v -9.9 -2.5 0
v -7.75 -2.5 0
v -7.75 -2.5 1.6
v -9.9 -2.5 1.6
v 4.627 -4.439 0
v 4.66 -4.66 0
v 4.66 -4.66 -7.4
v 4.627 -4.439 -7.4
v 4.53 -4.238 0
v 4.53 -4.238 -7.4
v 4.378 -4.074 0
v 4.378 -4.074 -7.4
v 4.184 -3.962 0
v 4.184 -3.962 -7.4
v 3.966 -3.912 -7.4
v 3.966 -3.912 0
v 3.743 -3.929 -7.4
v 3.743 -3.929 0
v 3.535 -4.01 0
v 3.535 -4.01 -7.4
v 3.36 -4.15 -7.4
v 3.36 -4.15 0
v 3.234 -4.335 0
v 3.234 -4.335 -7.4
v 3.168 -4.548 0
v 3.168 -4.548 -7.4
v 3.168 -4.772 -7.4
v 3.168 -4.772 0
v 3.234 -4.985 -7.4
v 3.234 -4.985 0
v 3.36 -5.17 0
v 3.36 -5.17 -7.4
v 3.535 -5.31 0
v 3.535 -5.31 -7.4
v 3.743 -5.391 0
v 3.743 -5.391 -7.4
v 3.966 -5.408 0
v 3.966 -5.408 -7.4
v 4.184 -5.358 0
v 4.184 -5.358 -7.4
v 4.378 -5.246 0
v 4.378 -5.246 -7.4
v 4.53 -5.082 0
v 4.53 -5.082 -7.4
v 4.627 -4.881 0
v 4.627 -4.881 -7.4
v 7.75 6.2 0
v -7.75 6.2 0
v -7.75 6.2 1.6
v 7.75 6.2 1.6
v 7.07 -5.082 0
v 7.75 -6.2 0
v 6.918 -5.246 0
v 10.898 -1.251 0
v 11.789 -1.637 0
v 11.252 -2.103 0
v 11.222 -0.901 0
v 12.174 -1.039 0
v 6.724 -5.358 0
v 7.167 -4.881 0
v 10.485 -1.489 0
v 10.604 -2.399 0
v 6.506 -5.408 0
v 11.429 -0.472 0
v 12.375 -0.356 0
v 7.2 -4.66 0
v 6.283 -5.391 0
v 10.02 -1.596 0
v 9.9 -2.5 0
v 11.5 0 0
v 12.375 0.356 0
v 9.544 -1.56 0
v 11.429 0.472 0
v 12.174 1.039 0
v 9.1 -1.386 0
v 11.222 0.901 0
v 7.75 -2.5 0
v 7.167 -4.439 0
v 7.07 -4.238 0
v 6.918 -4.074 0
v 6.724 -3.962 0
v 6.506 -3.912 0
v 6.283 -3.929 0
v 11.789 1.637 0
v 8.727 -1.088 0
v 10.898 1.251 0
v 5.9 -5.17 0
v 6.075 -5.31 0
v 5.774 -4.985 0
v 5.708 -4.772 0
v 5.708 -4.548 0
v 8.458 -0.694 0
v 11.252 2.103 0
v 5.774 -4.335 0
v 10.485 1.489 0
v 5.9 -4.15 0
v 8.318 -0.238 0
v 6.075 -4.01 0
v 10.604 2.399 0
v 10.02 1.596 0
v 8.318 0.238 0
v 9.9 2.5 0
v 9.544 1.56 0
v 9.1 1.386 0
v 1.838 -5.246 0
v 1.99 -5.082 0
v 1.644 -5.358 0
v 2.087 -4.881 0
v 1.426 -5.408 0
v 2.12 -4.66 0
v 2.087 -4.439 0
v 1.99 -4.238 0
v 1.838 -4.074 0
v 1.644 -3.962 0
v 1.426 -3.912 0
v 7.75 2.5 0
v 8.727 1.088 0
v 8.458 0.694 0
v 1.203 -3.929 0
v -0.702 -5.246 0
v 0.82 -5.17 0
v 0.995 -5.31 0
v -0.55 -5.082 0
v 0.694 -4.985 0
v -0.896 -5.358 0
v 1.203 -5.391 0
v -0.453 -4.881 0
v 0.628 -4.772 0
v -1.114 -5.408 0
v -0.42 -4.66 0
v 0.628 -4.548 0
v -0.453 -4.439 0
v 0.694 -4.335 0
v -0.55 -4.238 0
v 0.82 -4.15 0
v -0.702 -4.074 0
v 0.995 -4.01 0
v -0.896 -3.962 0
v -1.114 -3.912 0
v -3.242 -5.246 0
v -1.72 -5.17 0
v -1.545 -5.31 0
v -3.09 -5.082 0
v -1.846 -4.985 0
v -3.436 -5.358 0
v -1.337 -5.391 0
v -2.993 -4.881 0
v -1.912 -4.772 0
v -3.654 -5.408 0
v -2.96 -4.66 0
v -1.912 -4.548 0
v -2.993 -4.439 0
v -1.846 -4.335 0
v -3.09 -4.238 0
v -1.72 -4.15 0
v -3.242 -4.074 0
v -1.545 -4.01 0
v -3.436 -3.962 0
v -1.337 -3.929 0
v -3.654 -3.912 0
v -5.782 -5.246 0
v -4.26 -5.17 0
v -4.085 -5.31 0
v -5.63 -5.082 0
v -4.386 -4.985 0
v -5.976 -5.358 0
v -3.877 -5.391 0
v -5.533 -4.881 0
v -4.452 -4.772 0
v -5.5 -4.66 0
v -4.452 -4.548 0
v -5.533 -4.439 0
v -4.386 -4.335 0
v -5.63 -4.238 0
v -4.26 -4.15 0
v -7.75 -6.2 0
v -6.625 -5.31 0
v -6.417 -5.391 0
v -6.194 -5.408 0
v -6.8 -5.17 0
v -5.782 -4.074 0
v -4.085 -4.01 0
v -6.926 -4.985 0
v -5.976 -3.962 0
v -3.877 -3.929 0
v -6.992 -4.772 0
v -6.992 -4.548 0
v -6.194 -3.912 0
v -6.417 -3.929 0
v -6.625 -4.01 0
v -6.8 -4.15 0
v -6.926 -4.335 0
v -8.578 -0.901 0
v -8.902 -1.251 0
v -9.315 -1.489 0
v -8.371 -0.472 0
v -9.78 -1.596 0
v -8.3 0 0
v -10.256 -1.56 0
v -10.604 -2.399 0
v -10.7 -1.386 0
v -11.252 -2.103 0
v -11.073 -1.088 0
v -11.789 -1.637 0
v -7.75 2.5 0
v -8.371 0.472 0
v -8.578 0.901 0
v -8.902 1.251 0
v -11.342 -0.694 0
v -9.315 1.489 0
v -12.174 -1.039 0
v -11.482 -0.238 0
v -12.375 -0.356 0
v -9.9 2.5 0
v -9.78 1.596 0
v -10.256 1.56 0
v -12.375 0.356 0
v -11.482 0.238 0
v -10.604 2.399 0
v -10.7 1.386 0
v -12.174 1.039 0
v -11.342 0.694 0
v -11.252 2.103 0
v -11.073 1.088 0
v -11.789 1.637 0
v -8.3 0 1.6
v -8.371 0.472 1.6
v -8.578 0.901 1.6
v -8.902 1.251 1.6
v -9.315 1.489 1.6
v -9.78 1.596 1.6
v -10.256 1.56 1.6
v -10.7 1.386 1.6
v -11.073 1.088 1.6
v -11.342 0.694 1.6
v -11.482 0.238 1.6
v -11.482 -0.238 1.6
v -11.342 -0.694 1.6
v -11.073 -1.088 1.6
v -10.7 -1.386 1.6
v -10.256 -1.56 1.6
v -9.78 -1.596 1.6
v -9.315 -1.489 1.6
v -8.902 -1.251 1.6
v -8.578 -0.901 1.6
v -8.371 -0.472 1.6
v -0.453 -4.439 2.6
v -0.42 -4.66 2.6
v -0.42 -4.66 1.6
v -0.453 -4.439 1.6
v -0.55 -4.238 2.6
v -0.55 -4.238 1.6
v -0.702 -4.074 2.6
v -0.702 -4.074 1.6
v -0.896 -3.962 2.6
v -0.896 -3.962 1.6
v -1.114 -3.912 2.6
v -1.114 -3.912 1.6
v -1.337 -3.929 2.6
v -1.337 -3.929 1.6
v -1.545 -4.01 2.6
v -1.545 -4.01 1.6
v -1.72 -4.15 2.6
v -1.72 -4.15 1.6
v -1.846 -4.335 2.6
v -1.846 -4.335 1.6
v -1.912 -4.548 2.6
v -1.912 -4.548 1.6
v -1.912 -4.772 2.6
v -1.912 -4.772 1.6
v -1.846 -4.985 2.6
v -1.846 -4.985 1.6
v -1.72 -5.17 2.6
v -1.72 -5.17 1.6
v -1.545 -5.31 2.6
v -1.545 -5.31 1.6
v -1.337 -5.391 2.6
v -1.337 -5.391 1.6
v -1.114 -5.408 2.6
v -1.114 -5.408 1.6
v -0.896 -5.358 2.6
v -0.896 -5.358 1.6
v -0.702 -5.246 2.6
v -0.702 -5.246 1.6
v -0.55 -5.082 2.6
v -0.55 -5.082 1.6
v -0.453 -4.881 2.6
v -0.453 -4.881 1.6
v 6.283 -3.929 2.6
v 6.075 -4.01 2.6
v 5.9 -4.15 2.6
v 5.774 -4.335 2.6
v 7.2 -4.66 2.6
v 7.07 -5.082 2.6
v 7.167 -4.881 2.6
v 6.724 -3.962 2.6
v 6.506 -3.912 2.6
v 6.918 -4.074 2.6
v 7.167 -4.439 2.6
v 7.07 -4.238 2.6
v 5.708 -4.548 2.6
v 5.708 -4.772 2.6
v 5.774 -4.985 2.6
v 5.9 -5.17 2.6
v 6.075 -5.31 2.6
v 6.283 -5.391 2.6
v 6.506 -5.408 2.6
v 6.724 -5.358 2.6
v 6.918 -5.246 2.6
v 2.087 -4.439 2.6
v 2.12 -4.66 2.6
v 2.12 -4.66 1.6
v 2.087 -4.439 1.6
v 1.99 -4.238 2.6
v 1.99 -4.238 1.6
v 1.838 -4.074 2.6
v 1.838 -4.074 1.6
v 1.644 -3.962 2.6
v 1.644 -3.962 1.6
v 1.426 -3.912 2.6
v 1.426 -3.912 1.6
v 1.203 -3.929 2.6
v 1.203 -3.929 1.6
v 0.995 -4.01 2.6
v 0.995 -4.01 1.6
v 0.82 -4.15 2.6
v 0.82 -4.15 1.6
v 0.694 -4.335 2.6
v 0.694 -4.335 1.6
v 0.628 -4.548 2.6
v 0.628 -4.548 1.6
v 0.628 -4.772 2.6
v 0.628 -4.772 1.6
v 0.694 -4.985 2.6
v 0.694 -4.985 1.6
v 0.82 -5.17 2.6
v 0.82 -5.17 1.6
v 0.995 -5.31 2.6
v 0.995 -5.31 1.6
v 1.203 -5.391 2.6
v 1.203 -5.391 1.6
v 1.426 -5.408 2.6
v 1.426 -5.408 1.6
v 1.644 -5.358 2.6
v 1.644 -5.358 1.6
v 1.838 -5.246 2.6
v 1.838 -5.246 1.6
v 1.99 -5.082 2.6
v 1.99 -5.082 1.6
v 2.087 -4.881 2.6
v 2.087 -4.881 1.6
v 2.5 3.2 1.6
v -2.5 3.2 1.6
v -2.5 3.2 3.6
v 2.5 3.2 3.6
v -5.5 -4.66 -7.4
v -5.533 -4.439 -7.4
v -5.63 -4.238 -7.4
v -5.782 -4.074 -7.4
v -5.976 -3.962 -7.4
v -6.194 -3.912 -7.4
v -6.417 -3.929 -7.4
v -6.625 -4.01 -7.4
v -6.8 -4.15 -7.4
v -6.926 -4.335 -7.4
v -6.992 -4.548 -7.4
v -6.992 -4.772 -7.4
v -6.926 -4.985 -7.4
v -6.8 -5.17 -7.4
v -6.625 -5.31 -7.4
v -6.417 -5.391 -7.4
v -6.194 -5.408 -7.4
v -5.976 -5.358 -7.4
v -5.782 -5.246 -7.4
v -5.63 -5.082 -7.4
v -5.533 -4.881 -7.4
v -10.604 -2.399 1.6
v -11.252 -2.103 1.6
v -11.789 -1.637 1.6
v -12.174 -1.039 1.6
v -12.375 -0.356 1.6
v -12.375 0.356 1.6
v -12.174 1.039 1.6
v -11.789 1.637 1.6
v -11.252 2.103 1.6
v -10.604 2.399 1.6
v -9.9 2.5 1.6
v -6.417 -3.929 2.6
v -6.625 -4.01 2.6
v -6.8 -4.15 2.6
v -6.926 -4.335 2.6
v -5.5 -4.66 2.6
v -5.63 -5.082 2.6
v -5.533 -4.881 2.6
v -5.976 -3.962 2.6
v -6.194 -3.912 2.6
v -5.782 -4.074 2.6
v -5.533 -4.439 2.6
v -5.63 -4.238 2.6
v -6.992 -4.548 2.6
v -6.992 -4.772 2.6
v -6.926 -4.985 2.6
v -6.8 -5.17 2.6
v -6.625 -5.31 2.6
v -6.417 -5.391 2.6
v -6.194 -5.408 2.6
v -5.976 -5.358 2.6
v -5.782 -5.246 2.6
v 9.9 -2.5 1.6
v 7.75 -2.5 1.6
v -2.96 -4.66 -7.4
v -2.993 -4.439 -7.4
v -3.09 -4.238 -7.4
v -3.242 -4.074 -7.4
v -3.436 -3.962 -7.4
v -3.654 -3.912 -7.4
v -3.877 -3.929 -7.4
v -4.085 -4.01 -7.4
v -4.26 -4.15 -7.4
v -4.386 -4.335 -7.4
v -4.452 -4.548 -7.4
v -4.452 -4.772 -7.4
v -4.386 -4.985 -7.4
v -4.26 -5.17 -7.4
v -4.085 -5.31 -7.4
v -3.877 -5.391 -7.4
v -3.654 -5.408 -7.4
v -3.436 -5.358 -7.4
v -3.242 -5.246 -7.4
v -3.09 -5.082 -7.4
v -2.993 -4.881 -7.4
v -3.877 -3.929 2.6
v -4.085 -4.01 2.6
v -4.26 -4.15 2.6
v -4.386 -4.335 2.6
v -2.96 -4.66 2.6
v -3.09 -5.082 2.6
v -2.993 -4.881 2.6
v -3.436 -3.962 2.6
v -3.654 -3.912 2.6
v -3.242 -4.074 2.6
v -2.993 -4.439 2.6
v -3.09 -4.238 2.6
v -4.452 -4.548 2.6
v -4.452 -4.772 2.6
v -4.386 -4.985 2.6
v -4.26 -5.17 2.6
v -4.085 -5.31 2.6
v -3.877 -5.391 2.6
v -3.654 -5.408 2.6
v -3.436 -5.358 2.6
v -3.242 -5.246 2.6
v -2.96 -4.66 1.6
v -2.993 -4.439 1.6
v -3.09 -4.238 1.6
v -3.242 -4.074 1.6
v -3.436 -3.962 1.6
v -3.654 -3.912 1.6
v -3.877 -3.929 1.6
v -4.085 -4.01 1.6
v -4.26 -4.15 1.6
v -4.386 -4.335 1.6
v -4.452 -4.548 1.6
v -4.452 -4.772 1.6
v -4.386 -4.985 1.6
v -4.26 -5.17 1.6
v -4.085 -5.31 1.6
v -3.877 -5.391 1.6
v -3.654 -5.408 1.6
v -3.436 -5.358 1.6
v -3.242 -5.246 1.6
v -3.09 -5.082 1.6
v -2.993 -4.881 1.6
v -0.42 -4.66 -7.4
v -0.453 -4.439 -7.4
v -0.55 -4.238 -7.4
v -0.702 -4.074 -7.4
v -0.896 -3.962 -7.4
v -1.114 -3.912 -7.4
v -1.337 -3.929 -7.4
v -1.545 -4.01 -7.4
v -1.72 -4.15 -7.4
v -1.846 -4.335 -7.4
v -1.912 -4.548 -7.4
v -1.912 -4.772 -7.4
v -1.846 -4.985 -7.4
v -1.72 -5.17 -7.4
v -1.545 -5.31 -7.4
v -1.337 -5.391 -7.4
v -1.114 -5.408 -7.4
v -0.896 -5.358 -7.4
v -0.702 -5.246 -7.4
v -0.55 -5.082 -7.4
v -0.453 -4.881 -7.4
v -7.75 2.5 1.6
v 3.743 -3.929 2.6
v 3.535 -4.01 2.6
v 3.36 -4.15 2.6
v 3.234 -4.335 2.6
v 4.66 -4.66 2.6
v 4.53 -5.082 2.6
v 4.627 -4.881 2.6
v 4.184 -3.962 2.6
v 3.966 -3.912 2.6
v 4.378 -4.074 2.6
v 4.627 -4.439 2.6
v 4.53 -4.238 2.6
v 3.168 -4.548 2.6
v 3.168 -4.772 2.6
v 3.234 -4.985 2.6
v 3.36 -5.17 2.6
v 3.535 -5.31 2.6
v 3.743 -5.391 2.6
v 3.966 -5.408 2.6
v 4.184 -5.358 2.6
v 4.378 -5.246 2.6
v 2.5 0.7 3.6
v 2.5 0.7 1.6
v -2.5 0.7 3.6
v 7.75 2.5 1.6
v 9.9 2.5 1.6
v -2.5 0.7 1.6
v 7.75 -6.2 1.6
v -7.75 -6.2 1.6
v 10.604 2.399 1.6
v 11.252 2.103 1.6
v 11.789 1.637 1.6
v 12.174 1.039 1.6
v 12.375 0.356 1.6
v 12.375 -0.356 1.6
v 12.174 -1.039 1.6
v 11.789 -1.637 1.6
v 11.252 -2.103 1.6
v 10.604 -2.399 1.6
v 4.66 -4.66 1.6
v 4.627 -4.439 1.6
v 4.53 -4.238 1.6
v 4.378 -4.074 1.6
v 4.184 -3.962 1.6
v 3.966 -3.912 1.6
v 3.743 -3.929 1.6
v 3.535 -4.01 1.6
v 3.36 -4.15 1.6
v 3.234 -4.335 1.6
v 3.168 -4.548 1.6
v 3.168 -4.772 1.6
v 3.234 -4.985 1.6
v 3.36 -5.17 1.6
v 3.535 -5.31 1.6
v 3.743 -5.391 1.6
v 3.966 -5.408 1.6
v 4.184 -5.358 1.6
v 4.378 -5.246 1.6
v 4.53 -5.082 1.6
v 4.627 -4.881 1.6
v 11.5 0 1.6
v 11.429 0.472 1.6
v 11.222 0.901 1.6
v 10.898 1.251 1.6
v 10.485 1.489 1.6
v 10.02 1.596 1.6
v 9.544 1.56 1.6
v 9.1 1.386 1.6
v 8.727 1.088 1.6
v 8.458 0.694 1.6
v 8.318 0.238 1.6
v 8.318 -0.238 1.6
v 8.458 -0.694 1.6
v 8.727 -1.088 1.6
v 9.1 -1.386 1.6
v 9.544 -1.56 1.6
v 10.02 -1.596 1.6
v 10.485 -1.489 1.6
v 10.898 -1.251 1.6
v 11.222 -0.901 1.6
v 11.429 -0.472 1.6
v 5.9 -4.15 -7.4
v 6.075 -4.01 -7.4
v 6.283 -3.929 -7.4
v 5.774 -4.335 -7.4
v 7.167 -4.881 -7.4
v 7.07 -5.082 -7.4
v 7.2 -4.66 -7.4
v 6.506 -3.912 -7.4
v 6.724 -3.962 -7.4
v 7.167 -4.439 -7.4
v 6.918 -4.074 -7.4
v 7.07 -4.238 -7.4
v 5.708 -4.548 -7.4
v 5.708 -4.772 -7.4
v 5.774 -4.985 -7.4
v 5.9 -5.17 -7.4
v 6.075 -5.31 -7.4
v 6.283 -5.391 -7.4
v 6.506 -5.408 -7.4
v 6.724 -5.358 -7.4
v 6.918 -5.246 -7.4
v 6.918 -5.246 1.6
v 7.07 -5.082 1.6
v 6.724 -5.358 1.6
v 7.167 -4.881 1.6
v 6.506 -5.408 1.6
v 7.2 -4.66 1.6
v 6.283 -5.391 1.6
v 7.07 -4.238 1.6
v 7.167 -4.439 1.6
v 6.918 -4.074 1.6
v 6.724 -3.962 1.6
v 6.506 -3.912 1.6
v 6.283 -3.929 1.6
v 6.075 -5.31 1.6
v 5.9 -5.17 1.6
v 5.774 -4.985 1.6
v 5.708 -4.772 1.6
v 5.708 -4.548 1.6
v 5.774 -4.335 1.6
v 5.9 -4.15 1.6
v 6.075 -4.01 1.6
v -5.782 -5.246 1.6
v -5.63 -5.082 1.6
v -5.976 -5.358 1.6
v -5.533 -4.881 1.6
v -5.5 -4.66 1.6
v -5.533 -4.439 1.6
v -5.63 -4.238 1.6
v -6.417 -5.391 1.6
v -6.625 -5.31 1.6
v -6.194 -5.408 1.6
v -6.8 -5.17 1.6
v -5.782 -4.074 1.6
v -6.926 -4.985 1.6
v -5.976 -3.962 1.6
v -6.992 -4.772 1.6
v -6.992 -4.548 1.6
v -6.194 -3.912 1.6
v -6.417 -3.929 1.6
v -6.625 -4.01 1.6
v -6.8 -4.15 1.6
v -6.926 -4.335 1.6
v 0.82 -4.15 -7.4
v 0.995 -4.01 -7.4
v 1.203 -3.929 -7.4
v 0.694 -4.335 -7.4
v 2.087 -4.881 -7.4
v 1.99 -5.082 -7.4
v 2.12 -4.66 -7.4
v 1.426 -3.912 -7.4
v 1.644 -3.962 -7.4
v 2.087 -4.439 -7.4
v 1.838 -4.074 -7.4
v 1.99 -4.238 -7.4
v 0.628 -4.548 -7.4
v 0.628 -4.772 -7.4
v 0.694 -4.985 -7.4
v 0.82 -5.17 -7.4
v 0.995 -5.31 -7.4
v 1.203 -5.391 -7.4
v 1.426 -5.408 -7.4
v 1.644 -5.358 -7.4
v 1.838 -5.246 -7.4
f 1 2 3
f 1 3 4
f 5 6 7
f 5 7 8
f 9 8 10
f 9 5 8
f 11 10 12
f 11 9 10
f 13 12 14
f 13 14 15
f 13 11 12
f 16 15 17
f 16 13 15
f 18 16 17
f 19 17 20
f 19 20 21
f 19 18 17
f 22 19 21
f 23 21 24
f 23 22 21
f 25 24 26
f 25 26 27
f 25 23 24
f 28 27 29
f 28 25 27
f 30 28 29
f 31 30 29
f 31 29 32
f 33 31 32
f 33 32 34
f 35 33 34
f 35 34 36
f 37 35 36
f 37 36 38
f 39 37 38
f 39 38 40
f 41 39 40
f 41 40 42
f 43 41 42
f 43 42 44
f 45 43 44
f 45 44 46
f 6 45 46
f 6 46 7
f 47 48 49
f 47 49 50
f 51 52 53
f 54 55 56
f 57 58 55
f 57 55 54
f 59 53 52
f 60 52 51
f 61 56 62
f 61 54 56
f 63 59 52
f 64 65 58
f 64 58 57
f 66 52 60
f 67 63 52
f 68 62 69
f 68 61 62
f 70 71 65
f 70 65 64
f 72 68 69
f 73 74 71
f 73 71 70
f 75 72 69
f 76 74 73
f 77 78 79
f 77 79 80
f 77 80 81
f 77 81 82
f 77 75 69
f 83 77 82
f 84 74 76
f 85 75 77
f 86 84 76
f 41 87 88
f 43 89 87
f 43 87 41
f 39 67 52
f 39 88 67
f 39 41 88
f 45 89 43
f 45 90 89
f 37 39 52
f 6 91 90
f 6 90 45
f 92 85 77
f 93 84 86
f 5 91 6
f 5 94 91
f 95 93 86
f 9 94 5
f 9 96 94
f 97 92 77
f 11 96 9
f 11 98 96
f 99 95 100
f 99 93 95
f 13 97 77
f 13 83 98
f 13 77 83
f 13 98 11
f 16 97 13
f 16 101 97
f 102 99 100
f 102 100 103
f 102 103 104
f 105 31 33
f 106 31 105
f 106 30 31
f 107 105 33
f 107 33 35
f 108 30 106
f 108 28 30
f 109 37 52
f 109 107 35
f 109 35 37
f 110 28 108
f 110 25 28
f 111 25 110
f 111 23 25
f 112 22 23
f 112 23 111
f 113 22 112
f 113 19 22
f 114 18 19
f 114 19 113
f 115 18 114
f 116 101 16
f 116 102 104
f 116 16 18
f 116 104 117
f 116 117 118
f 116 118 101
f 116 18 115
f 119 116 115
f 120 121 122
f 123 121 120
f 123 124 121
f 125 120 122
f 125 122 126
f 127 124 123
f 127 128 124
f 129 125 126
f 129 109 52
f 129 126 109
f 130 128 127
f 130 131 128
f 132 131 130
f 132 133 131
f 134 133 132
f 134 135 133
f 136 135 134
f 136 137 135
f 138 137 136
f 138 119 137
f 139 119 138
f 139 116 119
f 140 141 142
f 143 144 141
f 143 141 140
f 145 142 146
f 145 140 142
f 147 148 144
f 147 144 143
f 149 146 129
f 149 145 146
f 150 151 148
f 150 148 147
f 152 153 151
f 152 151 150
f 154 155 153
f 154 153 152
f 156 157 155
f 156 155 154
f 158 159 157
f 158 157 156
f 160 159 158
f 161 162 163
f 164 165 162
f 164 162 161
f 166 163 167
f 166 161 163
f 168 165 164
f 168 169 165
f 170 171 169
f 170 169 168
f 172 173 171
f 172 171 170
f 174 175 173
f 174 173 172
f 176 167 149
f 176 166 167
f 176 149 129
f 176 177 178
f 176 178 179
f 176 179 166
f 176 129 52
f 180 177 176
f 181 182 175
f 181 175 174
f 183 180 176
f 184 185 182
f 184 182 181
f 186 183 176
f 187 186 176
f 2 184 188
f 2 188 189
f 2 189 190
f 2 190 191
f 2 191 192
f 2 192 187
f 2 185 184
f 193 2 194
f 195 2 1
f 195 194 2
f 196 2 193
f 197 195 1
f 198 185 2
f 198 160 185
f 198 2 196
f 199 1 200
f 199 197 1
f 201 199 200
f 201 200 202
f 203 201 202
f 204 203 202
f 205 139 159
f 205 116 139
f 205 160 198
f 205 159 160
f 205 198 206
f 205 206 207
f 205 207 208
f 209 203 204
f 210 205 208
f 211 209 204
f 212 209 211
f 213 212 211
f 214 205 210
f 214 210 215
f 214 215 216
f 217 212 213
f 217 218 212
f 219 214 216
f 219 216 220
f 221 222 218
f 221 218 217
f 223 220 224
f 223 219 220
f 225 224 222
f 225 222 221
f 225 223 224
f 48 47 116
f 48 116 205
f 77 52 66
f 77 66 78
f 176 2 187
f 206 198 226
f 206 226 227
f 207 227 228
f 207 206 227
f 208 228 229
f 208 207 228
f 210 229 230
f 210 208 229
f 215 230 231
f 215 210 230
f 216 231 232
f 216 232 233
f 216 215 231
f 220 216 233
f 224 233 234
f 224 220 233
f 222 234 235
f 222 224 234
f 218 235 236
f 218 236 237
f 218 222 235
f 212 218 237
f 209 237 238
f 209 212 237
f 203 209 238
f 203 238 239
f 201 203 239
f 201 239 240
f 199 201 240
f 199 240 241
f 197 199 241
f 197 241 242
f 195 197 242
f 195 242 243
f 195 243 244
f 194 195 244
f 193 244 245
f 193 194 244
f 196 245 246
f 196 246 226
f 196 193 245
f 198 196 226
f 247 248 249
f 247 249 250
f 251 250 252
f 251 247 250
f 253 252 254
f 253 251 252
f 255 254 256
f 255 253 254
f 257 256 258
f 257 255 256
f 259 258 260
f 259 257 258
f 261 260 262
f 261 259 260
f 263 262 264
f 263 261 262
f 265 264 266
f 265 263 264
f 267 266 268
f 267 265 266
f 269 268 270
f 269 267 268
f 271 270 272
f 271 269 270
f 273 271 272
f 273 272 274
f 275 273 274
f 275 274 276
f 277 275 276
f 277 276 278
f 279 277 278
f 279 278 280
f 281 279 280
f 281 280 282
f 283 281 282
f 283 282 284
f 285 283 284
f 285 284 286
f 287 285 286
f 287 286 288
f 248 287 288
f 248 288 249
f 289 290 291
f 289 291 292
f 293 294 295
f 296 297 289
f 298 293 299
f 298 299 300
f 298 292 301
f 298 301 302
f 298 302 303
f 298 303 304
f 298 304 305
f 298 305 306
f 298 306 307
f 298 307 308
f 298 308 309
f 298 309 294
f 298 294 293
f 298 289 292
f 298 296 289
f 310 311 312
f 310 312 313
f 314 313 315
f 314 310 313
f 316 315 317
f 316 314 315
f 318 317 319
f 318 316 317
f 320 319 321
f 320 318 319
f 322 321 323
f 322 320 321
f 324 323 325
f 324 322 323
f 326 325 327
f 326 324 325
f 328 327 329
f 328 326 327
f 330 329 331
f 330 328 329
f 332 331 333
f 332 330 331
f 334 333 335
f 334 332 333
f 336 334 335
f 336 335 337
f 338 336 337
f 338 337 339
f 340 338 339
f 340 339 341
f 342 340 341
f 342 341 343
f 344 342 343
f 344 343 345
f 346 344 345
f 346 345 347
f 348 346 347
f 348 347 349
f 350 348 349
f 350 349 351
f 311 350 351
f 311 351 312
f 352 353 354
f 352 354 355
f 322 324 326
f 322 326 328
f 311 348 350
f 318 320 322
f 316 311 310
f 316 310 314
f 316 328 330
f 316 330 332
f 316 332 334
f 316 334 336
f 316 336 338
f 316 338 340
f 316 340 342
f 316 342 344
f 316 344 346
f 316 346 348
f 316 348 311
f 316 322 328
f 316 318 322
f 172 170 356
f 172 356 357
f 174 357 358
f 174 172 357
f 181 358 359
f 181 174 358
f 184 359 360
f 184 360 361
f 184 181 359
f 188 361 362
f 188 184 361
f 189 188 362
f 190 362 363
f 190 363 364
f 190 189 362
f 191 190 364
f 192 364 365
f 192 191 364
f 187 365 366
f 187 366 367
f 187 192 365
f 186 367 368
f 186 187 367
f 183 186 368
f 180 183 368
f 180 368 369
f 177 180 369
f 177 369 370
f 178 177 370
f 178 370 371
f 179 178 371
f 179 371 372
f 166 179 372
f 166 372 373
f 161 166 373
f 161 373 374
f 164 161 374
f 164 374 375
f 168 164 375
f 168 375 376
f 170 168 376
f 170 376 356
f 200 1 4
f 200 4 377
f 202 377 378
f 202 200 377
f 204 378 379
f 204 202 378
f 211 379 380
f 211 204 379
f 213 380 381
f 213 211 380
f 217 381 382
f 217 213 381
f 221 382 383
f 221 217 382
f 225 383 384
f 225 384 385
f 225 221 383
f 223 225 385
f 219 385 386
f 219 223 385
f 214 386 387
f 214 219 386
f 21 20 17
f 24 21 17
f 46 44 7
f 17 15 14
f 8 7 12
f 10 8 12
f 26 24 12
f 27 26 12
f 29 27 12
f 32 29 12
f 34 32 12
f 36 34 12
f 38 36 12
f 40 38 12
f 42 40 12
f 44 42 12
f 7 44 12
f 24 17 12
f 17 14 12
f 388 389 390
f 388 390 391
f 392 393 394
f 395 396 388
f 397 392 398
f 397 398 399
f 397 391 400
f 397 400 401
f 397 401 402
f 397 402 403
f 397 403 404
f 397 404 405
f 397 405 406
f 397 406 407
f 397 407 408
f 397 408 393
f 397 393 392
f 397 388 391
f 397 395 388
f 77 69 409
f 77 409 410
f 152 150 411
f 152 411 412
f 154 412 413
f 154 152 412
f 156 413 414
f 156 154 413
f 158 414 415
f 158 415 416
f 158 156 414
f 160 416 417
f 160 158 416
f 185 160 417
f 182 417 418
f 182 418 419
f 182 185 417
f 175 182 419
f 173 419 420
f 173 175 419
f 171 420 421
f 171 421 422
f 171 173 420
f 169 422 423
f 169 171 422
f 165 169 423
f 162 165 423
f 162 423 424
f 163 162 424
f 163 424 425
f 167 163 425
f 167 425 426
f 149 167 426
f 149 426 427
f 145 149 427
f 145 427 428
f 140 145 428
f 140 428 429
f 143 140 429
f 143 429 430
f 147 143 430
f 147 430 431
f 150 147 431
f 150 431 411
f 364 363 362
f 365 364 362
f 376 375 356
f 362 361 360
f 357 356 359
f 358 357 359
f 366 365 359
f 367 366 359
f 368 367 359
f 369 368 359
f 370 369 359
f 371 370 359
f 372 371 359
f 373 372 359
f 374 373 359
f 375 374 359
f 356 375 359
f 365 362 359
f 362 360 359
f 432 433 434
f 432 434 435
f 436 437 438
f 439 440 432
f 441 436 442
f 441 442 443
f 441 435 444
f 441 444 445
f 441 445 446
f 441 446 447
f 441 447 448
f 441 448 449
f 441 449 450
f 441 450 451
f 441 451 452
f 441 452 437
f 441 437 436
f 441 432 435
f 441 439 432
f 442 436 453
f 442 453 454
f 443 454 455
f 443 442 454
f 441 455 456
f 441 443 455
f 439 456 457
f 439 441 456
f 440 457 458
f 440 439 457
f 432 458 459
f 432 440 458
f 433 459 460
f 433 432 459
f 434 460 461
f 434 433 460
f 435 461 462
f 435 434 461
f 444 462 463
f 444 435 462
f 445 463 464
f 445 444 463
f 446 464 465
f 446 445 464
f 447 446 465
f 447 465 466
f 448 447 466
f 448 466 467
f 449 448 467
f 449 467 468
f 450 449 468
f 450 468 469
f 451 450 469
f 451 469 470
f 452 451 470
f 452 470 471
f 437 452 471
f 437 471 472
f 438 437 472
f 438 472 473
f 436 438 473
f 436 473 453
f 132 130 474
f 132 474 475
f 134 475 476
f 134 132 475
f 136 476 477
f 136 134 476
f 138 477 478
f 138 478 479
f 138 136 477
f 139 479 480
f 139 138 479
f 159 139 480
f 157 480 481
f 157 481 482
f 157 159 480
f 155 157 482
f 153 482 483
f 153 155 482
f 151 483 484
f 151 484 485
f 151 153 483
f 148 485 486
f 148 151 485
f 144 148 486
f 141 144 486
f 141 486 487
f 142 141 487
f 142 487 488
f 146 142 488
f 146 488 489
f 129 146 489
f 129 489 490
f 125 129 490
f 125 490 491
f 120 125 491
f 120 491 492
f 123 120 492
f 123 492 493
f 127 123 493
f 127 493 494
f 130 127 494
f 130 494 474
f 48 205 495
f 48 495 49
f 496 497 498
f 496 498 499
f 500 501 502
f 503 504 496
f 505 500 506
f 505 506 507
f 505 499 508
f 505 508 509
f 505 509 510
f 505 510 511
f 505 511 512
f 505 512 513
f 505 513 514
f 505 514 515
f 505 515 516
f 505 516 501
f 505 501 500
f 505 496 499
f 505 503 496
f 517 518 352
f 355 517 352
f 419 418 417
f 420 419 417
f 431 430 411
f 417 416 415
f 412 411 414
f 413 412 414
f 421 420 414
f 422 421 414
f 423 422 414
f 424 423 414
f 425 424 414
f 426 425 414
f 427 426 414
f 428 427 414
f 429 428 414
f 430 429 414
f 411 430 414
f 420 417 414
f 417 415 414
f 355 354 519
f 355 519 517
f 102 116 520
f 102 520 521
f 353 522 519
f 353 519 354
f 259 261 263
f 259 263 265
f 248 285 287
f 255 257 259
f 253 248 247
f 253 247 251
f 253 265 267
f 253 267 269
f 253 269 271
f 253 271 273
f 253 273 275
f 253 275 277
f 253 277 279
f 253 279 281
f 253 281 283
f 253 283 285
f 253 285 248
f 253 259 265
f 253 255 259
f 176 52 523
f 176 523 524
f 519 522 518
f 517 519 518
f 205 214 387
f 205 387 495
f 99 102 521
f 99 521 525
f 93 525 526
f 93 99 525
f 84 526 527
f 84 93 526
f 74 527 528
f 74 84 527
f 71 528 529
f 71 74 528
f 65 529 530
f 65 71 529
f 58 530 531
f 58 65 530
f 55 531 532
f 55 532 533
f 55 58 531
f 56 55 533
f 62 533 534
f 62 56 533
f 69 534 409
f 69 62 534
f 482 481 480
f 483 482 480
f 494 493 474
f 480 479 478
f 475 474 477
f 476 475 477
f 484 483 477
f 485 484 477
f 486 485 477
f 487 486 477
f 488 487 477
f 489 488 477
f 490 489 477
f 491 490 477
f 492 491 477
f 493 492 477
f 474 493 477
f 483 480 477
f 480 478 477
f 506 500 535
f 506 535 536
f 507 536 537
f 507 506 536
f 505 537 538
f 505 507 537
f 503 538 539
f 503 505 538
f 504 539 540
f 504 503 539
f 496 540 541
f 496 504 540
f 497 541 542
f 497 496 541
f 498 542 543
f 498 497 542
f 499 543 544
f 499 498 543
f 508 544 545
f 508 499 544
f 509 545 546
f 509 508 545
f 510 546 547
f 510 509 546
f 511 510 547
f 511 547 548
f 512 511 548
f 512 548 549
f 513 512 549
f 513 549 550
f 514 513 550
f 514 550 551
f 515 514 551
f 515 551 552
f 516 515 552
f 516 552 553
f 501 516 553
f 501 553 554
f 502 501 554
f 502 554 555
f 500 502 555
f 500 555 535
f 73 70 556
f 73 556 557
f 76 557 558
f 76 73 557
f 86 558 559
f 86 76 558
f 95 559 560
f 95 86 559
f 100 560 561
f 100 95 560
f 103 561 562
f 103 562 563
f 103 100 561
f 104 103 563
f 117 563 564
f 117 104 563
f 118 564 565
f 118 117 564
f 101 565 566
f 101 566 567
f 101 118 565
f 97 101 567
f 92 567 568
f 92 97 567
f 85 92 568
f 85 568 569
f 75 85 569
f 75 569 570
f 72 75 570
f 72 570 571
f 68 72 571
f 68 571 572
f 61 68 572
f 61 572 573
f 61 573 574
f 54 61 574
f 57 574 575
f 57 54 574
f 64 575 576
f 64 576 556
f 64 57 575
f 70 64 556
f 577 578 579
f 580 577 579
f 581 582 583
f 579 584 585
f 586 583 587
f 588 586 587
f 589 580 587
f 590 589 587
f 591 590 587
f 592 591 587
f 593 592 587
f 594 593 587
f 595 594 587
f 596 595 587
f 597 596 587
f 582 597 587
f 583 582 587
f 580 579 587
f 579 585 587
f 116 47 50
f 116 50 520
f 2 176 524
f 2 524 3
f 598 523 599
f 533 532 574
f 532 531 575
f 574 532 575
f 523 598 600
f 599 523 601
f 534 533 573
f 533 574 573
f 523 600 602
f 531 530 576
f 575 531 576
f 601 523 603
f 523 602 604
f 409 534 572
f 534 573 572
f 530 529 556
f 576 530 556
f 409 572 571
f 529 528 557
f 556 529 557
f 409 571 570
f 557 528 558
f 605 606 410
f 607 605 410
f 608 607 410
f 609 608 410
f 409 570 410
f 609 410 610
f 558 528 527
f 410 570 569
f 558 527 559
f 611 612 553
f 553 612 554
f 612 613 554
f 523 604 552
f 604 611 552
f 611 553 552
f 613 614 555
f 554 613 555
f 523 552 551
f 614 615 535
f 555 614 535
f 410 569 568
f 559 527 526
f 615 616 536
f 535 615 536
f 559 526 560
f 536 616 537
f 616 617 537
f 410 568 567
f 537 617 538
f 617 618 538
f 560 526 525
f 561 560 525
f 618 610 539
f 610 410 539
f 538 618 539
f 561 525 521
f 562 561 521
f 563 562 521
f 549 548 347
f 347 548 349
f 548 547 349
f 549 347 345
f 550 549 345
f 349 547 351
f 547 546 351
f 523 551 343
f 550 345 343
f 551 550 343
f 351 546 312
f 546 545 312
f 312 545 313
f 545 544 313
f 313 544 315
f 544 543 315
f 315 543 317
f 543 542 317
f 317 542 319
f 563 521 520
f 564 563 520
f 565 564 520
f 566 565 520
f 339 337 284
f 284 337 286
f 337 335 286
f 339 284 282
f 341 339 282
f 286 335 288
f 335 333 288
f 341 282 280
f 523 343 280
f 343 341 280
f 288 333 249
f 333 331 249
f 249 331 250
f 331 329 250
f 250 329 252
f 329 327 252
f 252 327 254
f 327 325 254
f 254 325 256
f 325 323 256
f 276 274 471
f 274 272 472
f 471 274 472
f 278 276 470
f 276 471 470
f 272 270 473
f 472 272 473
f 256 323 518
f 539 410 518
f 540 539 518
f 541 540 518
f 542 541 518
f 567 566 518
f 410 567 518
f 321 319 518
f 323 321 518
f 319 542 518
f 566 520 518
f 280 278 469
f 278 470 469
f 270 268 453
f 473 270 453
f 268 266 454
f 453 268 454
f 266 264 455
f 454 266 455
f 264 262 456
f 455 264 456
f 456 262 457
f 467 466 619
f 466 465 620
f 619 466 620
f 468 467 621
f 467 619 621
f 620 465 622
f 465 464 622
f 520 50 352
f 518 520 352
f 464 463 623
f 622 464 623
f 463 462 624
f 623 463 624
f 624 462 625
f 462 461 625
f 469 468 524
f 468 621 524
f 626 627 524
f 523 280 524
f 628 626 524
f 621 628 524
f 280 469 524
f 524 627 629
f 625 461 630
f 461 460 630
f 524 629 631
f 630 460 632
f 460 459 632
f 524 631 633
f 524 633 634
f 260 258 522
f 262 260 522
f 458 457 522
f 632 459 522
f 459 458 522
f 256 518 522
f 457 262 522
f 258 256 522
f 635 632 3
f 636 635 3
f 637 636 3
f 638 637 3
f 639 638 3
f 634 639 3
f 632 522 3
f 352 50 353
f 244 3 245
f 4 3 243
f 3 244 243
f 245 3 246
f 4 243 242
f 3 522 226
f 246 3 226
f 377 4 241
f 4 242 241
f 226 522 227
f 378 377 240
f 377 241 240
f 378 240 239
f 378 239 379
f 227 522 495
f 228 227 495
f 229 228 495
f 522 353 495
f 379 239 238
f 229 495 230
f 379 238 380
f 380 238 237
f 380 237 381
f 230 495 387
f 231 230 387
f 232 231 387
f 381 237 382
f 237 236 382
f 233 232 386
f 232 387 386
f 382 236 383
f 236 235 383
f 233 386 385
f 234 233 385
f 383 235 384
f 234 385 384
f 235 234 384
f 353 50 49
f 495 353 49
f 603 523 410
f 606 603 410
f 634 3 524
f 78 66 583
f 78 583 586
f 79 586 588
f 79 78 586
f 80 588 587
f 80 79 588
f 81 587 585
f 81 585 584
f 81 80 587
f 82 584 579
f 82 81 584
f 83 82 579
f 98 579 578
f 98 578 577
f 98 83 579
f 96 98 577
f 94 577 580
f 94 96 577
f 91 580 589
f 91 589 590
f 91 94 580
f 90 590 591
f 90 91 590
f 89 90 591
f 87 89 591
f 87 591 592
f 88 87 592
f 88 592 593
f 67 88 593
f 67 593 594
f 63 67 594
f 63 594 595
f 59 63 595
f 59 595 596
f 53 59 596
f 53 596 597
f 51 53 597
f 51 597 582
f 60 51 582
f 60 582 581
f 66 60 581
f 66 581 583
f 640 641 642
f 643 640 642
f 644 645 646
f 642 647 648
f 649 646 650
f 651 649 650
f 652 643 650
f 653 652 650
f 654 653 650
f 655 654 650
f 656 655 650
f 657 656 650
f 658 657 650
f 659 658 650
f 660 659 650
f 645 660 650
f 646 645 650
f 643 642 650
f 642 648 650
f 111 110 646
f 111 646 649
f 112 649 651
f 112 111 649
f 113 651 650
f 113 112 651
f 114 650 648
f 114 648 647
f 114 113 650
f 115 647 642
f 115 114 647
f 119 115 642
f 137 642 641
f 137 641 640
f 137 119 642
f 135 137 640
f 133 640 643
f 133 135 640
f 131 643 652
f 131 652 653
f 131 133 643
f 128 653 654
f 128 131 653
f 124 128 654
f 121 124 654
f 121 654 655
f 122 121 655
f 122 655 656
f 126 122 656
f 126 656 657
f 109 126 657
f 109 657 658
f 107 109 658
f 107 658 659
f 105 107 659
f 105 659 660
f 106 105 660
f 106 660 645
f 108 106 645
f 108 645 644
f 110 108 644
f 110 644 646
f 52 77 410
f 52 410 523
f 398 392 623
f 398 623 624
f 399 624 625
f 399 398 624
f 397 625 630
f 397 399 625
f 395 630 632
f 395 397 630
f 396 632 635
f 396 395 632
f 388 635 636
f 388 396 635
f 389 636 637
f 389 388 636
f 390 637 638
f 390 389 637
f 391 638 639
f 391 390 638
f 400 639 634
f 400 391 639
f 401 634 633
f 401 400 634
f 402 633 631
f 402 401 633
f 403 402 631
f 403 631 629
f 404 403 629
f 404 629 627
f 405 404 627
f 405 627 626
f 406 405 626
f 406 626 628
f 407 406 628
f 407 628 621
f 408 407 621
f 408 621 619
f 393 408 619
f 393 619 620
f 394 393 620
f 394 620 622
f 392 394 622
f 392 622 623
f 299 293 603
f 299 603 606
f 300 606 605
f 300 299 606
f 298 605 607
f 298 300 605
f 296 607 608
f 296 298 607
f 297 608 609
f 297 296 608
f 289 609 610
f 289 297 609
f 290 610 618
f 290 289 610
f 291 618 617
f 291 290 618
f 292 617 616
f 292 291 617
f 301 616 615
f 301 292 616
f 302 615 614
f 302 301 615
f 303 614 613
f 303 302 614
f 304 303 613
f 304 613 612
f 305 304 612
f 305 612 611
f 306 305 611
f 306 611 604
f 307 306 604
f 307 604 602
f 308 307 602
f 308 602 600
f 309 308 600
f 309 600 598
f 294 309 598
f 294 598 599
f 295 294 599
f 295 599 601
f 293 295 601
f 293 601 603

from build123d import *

# Parameters (mm, degrees)
SKETCH1_R       = 1.6
MAIN_DEPTH      = 1.6
SKETCH2_W       = 5
SKETCH2_H       = 2.5
SENSOR_DEPTH    = 2
SKETCH3_R       = 0.75
CABLES_DEPTH    = 10
LPATTERN1_COUNT = 6
LPATTERN1_PITCH = 2.54


with BuildPart() as part:
    # Sketch1 → Main (new body)
    with BuildSketch(Plane.XY):
        with BuildLine():
            Line((-7.75, 6.2), (7.75, 6.2))
            Line((7.75, 6.2), (7.75, 2.5))
            Line((7.75, 2.5), (9.9, 2.5))
            ThreePointArc((9.9, 2.5), (12.4, 0), (9.9, -2.5))
            Line((9.9, -2.5), (7.75, -2.5))
            Line((7.75, -2.5), (7.75, -6.2))
            Line((7.75, -6.2), (-7.75, -6.2))
            Line((-7.75, -6.2), (-7.75, -2.5))
            Line((-7.75, -2.5), (-9.9, -2.5))
            ThreePointArc((-9.9, -2.5), (-12.4, 0), (-9.9, 2.5))
            Line((-9.9, 2.5), (-7.75, 2.5))
            Line((-7.75, 2.5), (-7.75, 6.2))
        make_face()
        with Locations((-9.9, 0)):
            Circle(SKETCH1_R, mode=Mode.SUBTRACT)
        with Locations((9.9, 0)):
            Circle(SKETCH1_R, mode=Mode.SUBTRACT)
    extrude(amount=MAIN_DEPTH)

    # Sketch2 → Sensor (add)
    with BuildSketch(Plane.XY.offset(1.6)):
        with Locations((0, 1.95)):
            Rectangle(SKETCH2_W, SKETCH2_H)
    extrude(amount=SENSOR_DEPTH)

    # Sketch3 → Cables (add)
    with BuildSketch(Plane.XY.offset(2.6)):
        with Locations((-6.25, -4.66)):
            Circle(SKETCH3_R)
    cables = extrude(amount=-CABLES_DEPTH)

    # LPattern1: Cables ×6
    with Locations(*[(i * LPATTERN1_PITCH, 0, 0) for i in range(1, LPATTERN1_COUNT)]):
        add(cables)


solid = part.part
